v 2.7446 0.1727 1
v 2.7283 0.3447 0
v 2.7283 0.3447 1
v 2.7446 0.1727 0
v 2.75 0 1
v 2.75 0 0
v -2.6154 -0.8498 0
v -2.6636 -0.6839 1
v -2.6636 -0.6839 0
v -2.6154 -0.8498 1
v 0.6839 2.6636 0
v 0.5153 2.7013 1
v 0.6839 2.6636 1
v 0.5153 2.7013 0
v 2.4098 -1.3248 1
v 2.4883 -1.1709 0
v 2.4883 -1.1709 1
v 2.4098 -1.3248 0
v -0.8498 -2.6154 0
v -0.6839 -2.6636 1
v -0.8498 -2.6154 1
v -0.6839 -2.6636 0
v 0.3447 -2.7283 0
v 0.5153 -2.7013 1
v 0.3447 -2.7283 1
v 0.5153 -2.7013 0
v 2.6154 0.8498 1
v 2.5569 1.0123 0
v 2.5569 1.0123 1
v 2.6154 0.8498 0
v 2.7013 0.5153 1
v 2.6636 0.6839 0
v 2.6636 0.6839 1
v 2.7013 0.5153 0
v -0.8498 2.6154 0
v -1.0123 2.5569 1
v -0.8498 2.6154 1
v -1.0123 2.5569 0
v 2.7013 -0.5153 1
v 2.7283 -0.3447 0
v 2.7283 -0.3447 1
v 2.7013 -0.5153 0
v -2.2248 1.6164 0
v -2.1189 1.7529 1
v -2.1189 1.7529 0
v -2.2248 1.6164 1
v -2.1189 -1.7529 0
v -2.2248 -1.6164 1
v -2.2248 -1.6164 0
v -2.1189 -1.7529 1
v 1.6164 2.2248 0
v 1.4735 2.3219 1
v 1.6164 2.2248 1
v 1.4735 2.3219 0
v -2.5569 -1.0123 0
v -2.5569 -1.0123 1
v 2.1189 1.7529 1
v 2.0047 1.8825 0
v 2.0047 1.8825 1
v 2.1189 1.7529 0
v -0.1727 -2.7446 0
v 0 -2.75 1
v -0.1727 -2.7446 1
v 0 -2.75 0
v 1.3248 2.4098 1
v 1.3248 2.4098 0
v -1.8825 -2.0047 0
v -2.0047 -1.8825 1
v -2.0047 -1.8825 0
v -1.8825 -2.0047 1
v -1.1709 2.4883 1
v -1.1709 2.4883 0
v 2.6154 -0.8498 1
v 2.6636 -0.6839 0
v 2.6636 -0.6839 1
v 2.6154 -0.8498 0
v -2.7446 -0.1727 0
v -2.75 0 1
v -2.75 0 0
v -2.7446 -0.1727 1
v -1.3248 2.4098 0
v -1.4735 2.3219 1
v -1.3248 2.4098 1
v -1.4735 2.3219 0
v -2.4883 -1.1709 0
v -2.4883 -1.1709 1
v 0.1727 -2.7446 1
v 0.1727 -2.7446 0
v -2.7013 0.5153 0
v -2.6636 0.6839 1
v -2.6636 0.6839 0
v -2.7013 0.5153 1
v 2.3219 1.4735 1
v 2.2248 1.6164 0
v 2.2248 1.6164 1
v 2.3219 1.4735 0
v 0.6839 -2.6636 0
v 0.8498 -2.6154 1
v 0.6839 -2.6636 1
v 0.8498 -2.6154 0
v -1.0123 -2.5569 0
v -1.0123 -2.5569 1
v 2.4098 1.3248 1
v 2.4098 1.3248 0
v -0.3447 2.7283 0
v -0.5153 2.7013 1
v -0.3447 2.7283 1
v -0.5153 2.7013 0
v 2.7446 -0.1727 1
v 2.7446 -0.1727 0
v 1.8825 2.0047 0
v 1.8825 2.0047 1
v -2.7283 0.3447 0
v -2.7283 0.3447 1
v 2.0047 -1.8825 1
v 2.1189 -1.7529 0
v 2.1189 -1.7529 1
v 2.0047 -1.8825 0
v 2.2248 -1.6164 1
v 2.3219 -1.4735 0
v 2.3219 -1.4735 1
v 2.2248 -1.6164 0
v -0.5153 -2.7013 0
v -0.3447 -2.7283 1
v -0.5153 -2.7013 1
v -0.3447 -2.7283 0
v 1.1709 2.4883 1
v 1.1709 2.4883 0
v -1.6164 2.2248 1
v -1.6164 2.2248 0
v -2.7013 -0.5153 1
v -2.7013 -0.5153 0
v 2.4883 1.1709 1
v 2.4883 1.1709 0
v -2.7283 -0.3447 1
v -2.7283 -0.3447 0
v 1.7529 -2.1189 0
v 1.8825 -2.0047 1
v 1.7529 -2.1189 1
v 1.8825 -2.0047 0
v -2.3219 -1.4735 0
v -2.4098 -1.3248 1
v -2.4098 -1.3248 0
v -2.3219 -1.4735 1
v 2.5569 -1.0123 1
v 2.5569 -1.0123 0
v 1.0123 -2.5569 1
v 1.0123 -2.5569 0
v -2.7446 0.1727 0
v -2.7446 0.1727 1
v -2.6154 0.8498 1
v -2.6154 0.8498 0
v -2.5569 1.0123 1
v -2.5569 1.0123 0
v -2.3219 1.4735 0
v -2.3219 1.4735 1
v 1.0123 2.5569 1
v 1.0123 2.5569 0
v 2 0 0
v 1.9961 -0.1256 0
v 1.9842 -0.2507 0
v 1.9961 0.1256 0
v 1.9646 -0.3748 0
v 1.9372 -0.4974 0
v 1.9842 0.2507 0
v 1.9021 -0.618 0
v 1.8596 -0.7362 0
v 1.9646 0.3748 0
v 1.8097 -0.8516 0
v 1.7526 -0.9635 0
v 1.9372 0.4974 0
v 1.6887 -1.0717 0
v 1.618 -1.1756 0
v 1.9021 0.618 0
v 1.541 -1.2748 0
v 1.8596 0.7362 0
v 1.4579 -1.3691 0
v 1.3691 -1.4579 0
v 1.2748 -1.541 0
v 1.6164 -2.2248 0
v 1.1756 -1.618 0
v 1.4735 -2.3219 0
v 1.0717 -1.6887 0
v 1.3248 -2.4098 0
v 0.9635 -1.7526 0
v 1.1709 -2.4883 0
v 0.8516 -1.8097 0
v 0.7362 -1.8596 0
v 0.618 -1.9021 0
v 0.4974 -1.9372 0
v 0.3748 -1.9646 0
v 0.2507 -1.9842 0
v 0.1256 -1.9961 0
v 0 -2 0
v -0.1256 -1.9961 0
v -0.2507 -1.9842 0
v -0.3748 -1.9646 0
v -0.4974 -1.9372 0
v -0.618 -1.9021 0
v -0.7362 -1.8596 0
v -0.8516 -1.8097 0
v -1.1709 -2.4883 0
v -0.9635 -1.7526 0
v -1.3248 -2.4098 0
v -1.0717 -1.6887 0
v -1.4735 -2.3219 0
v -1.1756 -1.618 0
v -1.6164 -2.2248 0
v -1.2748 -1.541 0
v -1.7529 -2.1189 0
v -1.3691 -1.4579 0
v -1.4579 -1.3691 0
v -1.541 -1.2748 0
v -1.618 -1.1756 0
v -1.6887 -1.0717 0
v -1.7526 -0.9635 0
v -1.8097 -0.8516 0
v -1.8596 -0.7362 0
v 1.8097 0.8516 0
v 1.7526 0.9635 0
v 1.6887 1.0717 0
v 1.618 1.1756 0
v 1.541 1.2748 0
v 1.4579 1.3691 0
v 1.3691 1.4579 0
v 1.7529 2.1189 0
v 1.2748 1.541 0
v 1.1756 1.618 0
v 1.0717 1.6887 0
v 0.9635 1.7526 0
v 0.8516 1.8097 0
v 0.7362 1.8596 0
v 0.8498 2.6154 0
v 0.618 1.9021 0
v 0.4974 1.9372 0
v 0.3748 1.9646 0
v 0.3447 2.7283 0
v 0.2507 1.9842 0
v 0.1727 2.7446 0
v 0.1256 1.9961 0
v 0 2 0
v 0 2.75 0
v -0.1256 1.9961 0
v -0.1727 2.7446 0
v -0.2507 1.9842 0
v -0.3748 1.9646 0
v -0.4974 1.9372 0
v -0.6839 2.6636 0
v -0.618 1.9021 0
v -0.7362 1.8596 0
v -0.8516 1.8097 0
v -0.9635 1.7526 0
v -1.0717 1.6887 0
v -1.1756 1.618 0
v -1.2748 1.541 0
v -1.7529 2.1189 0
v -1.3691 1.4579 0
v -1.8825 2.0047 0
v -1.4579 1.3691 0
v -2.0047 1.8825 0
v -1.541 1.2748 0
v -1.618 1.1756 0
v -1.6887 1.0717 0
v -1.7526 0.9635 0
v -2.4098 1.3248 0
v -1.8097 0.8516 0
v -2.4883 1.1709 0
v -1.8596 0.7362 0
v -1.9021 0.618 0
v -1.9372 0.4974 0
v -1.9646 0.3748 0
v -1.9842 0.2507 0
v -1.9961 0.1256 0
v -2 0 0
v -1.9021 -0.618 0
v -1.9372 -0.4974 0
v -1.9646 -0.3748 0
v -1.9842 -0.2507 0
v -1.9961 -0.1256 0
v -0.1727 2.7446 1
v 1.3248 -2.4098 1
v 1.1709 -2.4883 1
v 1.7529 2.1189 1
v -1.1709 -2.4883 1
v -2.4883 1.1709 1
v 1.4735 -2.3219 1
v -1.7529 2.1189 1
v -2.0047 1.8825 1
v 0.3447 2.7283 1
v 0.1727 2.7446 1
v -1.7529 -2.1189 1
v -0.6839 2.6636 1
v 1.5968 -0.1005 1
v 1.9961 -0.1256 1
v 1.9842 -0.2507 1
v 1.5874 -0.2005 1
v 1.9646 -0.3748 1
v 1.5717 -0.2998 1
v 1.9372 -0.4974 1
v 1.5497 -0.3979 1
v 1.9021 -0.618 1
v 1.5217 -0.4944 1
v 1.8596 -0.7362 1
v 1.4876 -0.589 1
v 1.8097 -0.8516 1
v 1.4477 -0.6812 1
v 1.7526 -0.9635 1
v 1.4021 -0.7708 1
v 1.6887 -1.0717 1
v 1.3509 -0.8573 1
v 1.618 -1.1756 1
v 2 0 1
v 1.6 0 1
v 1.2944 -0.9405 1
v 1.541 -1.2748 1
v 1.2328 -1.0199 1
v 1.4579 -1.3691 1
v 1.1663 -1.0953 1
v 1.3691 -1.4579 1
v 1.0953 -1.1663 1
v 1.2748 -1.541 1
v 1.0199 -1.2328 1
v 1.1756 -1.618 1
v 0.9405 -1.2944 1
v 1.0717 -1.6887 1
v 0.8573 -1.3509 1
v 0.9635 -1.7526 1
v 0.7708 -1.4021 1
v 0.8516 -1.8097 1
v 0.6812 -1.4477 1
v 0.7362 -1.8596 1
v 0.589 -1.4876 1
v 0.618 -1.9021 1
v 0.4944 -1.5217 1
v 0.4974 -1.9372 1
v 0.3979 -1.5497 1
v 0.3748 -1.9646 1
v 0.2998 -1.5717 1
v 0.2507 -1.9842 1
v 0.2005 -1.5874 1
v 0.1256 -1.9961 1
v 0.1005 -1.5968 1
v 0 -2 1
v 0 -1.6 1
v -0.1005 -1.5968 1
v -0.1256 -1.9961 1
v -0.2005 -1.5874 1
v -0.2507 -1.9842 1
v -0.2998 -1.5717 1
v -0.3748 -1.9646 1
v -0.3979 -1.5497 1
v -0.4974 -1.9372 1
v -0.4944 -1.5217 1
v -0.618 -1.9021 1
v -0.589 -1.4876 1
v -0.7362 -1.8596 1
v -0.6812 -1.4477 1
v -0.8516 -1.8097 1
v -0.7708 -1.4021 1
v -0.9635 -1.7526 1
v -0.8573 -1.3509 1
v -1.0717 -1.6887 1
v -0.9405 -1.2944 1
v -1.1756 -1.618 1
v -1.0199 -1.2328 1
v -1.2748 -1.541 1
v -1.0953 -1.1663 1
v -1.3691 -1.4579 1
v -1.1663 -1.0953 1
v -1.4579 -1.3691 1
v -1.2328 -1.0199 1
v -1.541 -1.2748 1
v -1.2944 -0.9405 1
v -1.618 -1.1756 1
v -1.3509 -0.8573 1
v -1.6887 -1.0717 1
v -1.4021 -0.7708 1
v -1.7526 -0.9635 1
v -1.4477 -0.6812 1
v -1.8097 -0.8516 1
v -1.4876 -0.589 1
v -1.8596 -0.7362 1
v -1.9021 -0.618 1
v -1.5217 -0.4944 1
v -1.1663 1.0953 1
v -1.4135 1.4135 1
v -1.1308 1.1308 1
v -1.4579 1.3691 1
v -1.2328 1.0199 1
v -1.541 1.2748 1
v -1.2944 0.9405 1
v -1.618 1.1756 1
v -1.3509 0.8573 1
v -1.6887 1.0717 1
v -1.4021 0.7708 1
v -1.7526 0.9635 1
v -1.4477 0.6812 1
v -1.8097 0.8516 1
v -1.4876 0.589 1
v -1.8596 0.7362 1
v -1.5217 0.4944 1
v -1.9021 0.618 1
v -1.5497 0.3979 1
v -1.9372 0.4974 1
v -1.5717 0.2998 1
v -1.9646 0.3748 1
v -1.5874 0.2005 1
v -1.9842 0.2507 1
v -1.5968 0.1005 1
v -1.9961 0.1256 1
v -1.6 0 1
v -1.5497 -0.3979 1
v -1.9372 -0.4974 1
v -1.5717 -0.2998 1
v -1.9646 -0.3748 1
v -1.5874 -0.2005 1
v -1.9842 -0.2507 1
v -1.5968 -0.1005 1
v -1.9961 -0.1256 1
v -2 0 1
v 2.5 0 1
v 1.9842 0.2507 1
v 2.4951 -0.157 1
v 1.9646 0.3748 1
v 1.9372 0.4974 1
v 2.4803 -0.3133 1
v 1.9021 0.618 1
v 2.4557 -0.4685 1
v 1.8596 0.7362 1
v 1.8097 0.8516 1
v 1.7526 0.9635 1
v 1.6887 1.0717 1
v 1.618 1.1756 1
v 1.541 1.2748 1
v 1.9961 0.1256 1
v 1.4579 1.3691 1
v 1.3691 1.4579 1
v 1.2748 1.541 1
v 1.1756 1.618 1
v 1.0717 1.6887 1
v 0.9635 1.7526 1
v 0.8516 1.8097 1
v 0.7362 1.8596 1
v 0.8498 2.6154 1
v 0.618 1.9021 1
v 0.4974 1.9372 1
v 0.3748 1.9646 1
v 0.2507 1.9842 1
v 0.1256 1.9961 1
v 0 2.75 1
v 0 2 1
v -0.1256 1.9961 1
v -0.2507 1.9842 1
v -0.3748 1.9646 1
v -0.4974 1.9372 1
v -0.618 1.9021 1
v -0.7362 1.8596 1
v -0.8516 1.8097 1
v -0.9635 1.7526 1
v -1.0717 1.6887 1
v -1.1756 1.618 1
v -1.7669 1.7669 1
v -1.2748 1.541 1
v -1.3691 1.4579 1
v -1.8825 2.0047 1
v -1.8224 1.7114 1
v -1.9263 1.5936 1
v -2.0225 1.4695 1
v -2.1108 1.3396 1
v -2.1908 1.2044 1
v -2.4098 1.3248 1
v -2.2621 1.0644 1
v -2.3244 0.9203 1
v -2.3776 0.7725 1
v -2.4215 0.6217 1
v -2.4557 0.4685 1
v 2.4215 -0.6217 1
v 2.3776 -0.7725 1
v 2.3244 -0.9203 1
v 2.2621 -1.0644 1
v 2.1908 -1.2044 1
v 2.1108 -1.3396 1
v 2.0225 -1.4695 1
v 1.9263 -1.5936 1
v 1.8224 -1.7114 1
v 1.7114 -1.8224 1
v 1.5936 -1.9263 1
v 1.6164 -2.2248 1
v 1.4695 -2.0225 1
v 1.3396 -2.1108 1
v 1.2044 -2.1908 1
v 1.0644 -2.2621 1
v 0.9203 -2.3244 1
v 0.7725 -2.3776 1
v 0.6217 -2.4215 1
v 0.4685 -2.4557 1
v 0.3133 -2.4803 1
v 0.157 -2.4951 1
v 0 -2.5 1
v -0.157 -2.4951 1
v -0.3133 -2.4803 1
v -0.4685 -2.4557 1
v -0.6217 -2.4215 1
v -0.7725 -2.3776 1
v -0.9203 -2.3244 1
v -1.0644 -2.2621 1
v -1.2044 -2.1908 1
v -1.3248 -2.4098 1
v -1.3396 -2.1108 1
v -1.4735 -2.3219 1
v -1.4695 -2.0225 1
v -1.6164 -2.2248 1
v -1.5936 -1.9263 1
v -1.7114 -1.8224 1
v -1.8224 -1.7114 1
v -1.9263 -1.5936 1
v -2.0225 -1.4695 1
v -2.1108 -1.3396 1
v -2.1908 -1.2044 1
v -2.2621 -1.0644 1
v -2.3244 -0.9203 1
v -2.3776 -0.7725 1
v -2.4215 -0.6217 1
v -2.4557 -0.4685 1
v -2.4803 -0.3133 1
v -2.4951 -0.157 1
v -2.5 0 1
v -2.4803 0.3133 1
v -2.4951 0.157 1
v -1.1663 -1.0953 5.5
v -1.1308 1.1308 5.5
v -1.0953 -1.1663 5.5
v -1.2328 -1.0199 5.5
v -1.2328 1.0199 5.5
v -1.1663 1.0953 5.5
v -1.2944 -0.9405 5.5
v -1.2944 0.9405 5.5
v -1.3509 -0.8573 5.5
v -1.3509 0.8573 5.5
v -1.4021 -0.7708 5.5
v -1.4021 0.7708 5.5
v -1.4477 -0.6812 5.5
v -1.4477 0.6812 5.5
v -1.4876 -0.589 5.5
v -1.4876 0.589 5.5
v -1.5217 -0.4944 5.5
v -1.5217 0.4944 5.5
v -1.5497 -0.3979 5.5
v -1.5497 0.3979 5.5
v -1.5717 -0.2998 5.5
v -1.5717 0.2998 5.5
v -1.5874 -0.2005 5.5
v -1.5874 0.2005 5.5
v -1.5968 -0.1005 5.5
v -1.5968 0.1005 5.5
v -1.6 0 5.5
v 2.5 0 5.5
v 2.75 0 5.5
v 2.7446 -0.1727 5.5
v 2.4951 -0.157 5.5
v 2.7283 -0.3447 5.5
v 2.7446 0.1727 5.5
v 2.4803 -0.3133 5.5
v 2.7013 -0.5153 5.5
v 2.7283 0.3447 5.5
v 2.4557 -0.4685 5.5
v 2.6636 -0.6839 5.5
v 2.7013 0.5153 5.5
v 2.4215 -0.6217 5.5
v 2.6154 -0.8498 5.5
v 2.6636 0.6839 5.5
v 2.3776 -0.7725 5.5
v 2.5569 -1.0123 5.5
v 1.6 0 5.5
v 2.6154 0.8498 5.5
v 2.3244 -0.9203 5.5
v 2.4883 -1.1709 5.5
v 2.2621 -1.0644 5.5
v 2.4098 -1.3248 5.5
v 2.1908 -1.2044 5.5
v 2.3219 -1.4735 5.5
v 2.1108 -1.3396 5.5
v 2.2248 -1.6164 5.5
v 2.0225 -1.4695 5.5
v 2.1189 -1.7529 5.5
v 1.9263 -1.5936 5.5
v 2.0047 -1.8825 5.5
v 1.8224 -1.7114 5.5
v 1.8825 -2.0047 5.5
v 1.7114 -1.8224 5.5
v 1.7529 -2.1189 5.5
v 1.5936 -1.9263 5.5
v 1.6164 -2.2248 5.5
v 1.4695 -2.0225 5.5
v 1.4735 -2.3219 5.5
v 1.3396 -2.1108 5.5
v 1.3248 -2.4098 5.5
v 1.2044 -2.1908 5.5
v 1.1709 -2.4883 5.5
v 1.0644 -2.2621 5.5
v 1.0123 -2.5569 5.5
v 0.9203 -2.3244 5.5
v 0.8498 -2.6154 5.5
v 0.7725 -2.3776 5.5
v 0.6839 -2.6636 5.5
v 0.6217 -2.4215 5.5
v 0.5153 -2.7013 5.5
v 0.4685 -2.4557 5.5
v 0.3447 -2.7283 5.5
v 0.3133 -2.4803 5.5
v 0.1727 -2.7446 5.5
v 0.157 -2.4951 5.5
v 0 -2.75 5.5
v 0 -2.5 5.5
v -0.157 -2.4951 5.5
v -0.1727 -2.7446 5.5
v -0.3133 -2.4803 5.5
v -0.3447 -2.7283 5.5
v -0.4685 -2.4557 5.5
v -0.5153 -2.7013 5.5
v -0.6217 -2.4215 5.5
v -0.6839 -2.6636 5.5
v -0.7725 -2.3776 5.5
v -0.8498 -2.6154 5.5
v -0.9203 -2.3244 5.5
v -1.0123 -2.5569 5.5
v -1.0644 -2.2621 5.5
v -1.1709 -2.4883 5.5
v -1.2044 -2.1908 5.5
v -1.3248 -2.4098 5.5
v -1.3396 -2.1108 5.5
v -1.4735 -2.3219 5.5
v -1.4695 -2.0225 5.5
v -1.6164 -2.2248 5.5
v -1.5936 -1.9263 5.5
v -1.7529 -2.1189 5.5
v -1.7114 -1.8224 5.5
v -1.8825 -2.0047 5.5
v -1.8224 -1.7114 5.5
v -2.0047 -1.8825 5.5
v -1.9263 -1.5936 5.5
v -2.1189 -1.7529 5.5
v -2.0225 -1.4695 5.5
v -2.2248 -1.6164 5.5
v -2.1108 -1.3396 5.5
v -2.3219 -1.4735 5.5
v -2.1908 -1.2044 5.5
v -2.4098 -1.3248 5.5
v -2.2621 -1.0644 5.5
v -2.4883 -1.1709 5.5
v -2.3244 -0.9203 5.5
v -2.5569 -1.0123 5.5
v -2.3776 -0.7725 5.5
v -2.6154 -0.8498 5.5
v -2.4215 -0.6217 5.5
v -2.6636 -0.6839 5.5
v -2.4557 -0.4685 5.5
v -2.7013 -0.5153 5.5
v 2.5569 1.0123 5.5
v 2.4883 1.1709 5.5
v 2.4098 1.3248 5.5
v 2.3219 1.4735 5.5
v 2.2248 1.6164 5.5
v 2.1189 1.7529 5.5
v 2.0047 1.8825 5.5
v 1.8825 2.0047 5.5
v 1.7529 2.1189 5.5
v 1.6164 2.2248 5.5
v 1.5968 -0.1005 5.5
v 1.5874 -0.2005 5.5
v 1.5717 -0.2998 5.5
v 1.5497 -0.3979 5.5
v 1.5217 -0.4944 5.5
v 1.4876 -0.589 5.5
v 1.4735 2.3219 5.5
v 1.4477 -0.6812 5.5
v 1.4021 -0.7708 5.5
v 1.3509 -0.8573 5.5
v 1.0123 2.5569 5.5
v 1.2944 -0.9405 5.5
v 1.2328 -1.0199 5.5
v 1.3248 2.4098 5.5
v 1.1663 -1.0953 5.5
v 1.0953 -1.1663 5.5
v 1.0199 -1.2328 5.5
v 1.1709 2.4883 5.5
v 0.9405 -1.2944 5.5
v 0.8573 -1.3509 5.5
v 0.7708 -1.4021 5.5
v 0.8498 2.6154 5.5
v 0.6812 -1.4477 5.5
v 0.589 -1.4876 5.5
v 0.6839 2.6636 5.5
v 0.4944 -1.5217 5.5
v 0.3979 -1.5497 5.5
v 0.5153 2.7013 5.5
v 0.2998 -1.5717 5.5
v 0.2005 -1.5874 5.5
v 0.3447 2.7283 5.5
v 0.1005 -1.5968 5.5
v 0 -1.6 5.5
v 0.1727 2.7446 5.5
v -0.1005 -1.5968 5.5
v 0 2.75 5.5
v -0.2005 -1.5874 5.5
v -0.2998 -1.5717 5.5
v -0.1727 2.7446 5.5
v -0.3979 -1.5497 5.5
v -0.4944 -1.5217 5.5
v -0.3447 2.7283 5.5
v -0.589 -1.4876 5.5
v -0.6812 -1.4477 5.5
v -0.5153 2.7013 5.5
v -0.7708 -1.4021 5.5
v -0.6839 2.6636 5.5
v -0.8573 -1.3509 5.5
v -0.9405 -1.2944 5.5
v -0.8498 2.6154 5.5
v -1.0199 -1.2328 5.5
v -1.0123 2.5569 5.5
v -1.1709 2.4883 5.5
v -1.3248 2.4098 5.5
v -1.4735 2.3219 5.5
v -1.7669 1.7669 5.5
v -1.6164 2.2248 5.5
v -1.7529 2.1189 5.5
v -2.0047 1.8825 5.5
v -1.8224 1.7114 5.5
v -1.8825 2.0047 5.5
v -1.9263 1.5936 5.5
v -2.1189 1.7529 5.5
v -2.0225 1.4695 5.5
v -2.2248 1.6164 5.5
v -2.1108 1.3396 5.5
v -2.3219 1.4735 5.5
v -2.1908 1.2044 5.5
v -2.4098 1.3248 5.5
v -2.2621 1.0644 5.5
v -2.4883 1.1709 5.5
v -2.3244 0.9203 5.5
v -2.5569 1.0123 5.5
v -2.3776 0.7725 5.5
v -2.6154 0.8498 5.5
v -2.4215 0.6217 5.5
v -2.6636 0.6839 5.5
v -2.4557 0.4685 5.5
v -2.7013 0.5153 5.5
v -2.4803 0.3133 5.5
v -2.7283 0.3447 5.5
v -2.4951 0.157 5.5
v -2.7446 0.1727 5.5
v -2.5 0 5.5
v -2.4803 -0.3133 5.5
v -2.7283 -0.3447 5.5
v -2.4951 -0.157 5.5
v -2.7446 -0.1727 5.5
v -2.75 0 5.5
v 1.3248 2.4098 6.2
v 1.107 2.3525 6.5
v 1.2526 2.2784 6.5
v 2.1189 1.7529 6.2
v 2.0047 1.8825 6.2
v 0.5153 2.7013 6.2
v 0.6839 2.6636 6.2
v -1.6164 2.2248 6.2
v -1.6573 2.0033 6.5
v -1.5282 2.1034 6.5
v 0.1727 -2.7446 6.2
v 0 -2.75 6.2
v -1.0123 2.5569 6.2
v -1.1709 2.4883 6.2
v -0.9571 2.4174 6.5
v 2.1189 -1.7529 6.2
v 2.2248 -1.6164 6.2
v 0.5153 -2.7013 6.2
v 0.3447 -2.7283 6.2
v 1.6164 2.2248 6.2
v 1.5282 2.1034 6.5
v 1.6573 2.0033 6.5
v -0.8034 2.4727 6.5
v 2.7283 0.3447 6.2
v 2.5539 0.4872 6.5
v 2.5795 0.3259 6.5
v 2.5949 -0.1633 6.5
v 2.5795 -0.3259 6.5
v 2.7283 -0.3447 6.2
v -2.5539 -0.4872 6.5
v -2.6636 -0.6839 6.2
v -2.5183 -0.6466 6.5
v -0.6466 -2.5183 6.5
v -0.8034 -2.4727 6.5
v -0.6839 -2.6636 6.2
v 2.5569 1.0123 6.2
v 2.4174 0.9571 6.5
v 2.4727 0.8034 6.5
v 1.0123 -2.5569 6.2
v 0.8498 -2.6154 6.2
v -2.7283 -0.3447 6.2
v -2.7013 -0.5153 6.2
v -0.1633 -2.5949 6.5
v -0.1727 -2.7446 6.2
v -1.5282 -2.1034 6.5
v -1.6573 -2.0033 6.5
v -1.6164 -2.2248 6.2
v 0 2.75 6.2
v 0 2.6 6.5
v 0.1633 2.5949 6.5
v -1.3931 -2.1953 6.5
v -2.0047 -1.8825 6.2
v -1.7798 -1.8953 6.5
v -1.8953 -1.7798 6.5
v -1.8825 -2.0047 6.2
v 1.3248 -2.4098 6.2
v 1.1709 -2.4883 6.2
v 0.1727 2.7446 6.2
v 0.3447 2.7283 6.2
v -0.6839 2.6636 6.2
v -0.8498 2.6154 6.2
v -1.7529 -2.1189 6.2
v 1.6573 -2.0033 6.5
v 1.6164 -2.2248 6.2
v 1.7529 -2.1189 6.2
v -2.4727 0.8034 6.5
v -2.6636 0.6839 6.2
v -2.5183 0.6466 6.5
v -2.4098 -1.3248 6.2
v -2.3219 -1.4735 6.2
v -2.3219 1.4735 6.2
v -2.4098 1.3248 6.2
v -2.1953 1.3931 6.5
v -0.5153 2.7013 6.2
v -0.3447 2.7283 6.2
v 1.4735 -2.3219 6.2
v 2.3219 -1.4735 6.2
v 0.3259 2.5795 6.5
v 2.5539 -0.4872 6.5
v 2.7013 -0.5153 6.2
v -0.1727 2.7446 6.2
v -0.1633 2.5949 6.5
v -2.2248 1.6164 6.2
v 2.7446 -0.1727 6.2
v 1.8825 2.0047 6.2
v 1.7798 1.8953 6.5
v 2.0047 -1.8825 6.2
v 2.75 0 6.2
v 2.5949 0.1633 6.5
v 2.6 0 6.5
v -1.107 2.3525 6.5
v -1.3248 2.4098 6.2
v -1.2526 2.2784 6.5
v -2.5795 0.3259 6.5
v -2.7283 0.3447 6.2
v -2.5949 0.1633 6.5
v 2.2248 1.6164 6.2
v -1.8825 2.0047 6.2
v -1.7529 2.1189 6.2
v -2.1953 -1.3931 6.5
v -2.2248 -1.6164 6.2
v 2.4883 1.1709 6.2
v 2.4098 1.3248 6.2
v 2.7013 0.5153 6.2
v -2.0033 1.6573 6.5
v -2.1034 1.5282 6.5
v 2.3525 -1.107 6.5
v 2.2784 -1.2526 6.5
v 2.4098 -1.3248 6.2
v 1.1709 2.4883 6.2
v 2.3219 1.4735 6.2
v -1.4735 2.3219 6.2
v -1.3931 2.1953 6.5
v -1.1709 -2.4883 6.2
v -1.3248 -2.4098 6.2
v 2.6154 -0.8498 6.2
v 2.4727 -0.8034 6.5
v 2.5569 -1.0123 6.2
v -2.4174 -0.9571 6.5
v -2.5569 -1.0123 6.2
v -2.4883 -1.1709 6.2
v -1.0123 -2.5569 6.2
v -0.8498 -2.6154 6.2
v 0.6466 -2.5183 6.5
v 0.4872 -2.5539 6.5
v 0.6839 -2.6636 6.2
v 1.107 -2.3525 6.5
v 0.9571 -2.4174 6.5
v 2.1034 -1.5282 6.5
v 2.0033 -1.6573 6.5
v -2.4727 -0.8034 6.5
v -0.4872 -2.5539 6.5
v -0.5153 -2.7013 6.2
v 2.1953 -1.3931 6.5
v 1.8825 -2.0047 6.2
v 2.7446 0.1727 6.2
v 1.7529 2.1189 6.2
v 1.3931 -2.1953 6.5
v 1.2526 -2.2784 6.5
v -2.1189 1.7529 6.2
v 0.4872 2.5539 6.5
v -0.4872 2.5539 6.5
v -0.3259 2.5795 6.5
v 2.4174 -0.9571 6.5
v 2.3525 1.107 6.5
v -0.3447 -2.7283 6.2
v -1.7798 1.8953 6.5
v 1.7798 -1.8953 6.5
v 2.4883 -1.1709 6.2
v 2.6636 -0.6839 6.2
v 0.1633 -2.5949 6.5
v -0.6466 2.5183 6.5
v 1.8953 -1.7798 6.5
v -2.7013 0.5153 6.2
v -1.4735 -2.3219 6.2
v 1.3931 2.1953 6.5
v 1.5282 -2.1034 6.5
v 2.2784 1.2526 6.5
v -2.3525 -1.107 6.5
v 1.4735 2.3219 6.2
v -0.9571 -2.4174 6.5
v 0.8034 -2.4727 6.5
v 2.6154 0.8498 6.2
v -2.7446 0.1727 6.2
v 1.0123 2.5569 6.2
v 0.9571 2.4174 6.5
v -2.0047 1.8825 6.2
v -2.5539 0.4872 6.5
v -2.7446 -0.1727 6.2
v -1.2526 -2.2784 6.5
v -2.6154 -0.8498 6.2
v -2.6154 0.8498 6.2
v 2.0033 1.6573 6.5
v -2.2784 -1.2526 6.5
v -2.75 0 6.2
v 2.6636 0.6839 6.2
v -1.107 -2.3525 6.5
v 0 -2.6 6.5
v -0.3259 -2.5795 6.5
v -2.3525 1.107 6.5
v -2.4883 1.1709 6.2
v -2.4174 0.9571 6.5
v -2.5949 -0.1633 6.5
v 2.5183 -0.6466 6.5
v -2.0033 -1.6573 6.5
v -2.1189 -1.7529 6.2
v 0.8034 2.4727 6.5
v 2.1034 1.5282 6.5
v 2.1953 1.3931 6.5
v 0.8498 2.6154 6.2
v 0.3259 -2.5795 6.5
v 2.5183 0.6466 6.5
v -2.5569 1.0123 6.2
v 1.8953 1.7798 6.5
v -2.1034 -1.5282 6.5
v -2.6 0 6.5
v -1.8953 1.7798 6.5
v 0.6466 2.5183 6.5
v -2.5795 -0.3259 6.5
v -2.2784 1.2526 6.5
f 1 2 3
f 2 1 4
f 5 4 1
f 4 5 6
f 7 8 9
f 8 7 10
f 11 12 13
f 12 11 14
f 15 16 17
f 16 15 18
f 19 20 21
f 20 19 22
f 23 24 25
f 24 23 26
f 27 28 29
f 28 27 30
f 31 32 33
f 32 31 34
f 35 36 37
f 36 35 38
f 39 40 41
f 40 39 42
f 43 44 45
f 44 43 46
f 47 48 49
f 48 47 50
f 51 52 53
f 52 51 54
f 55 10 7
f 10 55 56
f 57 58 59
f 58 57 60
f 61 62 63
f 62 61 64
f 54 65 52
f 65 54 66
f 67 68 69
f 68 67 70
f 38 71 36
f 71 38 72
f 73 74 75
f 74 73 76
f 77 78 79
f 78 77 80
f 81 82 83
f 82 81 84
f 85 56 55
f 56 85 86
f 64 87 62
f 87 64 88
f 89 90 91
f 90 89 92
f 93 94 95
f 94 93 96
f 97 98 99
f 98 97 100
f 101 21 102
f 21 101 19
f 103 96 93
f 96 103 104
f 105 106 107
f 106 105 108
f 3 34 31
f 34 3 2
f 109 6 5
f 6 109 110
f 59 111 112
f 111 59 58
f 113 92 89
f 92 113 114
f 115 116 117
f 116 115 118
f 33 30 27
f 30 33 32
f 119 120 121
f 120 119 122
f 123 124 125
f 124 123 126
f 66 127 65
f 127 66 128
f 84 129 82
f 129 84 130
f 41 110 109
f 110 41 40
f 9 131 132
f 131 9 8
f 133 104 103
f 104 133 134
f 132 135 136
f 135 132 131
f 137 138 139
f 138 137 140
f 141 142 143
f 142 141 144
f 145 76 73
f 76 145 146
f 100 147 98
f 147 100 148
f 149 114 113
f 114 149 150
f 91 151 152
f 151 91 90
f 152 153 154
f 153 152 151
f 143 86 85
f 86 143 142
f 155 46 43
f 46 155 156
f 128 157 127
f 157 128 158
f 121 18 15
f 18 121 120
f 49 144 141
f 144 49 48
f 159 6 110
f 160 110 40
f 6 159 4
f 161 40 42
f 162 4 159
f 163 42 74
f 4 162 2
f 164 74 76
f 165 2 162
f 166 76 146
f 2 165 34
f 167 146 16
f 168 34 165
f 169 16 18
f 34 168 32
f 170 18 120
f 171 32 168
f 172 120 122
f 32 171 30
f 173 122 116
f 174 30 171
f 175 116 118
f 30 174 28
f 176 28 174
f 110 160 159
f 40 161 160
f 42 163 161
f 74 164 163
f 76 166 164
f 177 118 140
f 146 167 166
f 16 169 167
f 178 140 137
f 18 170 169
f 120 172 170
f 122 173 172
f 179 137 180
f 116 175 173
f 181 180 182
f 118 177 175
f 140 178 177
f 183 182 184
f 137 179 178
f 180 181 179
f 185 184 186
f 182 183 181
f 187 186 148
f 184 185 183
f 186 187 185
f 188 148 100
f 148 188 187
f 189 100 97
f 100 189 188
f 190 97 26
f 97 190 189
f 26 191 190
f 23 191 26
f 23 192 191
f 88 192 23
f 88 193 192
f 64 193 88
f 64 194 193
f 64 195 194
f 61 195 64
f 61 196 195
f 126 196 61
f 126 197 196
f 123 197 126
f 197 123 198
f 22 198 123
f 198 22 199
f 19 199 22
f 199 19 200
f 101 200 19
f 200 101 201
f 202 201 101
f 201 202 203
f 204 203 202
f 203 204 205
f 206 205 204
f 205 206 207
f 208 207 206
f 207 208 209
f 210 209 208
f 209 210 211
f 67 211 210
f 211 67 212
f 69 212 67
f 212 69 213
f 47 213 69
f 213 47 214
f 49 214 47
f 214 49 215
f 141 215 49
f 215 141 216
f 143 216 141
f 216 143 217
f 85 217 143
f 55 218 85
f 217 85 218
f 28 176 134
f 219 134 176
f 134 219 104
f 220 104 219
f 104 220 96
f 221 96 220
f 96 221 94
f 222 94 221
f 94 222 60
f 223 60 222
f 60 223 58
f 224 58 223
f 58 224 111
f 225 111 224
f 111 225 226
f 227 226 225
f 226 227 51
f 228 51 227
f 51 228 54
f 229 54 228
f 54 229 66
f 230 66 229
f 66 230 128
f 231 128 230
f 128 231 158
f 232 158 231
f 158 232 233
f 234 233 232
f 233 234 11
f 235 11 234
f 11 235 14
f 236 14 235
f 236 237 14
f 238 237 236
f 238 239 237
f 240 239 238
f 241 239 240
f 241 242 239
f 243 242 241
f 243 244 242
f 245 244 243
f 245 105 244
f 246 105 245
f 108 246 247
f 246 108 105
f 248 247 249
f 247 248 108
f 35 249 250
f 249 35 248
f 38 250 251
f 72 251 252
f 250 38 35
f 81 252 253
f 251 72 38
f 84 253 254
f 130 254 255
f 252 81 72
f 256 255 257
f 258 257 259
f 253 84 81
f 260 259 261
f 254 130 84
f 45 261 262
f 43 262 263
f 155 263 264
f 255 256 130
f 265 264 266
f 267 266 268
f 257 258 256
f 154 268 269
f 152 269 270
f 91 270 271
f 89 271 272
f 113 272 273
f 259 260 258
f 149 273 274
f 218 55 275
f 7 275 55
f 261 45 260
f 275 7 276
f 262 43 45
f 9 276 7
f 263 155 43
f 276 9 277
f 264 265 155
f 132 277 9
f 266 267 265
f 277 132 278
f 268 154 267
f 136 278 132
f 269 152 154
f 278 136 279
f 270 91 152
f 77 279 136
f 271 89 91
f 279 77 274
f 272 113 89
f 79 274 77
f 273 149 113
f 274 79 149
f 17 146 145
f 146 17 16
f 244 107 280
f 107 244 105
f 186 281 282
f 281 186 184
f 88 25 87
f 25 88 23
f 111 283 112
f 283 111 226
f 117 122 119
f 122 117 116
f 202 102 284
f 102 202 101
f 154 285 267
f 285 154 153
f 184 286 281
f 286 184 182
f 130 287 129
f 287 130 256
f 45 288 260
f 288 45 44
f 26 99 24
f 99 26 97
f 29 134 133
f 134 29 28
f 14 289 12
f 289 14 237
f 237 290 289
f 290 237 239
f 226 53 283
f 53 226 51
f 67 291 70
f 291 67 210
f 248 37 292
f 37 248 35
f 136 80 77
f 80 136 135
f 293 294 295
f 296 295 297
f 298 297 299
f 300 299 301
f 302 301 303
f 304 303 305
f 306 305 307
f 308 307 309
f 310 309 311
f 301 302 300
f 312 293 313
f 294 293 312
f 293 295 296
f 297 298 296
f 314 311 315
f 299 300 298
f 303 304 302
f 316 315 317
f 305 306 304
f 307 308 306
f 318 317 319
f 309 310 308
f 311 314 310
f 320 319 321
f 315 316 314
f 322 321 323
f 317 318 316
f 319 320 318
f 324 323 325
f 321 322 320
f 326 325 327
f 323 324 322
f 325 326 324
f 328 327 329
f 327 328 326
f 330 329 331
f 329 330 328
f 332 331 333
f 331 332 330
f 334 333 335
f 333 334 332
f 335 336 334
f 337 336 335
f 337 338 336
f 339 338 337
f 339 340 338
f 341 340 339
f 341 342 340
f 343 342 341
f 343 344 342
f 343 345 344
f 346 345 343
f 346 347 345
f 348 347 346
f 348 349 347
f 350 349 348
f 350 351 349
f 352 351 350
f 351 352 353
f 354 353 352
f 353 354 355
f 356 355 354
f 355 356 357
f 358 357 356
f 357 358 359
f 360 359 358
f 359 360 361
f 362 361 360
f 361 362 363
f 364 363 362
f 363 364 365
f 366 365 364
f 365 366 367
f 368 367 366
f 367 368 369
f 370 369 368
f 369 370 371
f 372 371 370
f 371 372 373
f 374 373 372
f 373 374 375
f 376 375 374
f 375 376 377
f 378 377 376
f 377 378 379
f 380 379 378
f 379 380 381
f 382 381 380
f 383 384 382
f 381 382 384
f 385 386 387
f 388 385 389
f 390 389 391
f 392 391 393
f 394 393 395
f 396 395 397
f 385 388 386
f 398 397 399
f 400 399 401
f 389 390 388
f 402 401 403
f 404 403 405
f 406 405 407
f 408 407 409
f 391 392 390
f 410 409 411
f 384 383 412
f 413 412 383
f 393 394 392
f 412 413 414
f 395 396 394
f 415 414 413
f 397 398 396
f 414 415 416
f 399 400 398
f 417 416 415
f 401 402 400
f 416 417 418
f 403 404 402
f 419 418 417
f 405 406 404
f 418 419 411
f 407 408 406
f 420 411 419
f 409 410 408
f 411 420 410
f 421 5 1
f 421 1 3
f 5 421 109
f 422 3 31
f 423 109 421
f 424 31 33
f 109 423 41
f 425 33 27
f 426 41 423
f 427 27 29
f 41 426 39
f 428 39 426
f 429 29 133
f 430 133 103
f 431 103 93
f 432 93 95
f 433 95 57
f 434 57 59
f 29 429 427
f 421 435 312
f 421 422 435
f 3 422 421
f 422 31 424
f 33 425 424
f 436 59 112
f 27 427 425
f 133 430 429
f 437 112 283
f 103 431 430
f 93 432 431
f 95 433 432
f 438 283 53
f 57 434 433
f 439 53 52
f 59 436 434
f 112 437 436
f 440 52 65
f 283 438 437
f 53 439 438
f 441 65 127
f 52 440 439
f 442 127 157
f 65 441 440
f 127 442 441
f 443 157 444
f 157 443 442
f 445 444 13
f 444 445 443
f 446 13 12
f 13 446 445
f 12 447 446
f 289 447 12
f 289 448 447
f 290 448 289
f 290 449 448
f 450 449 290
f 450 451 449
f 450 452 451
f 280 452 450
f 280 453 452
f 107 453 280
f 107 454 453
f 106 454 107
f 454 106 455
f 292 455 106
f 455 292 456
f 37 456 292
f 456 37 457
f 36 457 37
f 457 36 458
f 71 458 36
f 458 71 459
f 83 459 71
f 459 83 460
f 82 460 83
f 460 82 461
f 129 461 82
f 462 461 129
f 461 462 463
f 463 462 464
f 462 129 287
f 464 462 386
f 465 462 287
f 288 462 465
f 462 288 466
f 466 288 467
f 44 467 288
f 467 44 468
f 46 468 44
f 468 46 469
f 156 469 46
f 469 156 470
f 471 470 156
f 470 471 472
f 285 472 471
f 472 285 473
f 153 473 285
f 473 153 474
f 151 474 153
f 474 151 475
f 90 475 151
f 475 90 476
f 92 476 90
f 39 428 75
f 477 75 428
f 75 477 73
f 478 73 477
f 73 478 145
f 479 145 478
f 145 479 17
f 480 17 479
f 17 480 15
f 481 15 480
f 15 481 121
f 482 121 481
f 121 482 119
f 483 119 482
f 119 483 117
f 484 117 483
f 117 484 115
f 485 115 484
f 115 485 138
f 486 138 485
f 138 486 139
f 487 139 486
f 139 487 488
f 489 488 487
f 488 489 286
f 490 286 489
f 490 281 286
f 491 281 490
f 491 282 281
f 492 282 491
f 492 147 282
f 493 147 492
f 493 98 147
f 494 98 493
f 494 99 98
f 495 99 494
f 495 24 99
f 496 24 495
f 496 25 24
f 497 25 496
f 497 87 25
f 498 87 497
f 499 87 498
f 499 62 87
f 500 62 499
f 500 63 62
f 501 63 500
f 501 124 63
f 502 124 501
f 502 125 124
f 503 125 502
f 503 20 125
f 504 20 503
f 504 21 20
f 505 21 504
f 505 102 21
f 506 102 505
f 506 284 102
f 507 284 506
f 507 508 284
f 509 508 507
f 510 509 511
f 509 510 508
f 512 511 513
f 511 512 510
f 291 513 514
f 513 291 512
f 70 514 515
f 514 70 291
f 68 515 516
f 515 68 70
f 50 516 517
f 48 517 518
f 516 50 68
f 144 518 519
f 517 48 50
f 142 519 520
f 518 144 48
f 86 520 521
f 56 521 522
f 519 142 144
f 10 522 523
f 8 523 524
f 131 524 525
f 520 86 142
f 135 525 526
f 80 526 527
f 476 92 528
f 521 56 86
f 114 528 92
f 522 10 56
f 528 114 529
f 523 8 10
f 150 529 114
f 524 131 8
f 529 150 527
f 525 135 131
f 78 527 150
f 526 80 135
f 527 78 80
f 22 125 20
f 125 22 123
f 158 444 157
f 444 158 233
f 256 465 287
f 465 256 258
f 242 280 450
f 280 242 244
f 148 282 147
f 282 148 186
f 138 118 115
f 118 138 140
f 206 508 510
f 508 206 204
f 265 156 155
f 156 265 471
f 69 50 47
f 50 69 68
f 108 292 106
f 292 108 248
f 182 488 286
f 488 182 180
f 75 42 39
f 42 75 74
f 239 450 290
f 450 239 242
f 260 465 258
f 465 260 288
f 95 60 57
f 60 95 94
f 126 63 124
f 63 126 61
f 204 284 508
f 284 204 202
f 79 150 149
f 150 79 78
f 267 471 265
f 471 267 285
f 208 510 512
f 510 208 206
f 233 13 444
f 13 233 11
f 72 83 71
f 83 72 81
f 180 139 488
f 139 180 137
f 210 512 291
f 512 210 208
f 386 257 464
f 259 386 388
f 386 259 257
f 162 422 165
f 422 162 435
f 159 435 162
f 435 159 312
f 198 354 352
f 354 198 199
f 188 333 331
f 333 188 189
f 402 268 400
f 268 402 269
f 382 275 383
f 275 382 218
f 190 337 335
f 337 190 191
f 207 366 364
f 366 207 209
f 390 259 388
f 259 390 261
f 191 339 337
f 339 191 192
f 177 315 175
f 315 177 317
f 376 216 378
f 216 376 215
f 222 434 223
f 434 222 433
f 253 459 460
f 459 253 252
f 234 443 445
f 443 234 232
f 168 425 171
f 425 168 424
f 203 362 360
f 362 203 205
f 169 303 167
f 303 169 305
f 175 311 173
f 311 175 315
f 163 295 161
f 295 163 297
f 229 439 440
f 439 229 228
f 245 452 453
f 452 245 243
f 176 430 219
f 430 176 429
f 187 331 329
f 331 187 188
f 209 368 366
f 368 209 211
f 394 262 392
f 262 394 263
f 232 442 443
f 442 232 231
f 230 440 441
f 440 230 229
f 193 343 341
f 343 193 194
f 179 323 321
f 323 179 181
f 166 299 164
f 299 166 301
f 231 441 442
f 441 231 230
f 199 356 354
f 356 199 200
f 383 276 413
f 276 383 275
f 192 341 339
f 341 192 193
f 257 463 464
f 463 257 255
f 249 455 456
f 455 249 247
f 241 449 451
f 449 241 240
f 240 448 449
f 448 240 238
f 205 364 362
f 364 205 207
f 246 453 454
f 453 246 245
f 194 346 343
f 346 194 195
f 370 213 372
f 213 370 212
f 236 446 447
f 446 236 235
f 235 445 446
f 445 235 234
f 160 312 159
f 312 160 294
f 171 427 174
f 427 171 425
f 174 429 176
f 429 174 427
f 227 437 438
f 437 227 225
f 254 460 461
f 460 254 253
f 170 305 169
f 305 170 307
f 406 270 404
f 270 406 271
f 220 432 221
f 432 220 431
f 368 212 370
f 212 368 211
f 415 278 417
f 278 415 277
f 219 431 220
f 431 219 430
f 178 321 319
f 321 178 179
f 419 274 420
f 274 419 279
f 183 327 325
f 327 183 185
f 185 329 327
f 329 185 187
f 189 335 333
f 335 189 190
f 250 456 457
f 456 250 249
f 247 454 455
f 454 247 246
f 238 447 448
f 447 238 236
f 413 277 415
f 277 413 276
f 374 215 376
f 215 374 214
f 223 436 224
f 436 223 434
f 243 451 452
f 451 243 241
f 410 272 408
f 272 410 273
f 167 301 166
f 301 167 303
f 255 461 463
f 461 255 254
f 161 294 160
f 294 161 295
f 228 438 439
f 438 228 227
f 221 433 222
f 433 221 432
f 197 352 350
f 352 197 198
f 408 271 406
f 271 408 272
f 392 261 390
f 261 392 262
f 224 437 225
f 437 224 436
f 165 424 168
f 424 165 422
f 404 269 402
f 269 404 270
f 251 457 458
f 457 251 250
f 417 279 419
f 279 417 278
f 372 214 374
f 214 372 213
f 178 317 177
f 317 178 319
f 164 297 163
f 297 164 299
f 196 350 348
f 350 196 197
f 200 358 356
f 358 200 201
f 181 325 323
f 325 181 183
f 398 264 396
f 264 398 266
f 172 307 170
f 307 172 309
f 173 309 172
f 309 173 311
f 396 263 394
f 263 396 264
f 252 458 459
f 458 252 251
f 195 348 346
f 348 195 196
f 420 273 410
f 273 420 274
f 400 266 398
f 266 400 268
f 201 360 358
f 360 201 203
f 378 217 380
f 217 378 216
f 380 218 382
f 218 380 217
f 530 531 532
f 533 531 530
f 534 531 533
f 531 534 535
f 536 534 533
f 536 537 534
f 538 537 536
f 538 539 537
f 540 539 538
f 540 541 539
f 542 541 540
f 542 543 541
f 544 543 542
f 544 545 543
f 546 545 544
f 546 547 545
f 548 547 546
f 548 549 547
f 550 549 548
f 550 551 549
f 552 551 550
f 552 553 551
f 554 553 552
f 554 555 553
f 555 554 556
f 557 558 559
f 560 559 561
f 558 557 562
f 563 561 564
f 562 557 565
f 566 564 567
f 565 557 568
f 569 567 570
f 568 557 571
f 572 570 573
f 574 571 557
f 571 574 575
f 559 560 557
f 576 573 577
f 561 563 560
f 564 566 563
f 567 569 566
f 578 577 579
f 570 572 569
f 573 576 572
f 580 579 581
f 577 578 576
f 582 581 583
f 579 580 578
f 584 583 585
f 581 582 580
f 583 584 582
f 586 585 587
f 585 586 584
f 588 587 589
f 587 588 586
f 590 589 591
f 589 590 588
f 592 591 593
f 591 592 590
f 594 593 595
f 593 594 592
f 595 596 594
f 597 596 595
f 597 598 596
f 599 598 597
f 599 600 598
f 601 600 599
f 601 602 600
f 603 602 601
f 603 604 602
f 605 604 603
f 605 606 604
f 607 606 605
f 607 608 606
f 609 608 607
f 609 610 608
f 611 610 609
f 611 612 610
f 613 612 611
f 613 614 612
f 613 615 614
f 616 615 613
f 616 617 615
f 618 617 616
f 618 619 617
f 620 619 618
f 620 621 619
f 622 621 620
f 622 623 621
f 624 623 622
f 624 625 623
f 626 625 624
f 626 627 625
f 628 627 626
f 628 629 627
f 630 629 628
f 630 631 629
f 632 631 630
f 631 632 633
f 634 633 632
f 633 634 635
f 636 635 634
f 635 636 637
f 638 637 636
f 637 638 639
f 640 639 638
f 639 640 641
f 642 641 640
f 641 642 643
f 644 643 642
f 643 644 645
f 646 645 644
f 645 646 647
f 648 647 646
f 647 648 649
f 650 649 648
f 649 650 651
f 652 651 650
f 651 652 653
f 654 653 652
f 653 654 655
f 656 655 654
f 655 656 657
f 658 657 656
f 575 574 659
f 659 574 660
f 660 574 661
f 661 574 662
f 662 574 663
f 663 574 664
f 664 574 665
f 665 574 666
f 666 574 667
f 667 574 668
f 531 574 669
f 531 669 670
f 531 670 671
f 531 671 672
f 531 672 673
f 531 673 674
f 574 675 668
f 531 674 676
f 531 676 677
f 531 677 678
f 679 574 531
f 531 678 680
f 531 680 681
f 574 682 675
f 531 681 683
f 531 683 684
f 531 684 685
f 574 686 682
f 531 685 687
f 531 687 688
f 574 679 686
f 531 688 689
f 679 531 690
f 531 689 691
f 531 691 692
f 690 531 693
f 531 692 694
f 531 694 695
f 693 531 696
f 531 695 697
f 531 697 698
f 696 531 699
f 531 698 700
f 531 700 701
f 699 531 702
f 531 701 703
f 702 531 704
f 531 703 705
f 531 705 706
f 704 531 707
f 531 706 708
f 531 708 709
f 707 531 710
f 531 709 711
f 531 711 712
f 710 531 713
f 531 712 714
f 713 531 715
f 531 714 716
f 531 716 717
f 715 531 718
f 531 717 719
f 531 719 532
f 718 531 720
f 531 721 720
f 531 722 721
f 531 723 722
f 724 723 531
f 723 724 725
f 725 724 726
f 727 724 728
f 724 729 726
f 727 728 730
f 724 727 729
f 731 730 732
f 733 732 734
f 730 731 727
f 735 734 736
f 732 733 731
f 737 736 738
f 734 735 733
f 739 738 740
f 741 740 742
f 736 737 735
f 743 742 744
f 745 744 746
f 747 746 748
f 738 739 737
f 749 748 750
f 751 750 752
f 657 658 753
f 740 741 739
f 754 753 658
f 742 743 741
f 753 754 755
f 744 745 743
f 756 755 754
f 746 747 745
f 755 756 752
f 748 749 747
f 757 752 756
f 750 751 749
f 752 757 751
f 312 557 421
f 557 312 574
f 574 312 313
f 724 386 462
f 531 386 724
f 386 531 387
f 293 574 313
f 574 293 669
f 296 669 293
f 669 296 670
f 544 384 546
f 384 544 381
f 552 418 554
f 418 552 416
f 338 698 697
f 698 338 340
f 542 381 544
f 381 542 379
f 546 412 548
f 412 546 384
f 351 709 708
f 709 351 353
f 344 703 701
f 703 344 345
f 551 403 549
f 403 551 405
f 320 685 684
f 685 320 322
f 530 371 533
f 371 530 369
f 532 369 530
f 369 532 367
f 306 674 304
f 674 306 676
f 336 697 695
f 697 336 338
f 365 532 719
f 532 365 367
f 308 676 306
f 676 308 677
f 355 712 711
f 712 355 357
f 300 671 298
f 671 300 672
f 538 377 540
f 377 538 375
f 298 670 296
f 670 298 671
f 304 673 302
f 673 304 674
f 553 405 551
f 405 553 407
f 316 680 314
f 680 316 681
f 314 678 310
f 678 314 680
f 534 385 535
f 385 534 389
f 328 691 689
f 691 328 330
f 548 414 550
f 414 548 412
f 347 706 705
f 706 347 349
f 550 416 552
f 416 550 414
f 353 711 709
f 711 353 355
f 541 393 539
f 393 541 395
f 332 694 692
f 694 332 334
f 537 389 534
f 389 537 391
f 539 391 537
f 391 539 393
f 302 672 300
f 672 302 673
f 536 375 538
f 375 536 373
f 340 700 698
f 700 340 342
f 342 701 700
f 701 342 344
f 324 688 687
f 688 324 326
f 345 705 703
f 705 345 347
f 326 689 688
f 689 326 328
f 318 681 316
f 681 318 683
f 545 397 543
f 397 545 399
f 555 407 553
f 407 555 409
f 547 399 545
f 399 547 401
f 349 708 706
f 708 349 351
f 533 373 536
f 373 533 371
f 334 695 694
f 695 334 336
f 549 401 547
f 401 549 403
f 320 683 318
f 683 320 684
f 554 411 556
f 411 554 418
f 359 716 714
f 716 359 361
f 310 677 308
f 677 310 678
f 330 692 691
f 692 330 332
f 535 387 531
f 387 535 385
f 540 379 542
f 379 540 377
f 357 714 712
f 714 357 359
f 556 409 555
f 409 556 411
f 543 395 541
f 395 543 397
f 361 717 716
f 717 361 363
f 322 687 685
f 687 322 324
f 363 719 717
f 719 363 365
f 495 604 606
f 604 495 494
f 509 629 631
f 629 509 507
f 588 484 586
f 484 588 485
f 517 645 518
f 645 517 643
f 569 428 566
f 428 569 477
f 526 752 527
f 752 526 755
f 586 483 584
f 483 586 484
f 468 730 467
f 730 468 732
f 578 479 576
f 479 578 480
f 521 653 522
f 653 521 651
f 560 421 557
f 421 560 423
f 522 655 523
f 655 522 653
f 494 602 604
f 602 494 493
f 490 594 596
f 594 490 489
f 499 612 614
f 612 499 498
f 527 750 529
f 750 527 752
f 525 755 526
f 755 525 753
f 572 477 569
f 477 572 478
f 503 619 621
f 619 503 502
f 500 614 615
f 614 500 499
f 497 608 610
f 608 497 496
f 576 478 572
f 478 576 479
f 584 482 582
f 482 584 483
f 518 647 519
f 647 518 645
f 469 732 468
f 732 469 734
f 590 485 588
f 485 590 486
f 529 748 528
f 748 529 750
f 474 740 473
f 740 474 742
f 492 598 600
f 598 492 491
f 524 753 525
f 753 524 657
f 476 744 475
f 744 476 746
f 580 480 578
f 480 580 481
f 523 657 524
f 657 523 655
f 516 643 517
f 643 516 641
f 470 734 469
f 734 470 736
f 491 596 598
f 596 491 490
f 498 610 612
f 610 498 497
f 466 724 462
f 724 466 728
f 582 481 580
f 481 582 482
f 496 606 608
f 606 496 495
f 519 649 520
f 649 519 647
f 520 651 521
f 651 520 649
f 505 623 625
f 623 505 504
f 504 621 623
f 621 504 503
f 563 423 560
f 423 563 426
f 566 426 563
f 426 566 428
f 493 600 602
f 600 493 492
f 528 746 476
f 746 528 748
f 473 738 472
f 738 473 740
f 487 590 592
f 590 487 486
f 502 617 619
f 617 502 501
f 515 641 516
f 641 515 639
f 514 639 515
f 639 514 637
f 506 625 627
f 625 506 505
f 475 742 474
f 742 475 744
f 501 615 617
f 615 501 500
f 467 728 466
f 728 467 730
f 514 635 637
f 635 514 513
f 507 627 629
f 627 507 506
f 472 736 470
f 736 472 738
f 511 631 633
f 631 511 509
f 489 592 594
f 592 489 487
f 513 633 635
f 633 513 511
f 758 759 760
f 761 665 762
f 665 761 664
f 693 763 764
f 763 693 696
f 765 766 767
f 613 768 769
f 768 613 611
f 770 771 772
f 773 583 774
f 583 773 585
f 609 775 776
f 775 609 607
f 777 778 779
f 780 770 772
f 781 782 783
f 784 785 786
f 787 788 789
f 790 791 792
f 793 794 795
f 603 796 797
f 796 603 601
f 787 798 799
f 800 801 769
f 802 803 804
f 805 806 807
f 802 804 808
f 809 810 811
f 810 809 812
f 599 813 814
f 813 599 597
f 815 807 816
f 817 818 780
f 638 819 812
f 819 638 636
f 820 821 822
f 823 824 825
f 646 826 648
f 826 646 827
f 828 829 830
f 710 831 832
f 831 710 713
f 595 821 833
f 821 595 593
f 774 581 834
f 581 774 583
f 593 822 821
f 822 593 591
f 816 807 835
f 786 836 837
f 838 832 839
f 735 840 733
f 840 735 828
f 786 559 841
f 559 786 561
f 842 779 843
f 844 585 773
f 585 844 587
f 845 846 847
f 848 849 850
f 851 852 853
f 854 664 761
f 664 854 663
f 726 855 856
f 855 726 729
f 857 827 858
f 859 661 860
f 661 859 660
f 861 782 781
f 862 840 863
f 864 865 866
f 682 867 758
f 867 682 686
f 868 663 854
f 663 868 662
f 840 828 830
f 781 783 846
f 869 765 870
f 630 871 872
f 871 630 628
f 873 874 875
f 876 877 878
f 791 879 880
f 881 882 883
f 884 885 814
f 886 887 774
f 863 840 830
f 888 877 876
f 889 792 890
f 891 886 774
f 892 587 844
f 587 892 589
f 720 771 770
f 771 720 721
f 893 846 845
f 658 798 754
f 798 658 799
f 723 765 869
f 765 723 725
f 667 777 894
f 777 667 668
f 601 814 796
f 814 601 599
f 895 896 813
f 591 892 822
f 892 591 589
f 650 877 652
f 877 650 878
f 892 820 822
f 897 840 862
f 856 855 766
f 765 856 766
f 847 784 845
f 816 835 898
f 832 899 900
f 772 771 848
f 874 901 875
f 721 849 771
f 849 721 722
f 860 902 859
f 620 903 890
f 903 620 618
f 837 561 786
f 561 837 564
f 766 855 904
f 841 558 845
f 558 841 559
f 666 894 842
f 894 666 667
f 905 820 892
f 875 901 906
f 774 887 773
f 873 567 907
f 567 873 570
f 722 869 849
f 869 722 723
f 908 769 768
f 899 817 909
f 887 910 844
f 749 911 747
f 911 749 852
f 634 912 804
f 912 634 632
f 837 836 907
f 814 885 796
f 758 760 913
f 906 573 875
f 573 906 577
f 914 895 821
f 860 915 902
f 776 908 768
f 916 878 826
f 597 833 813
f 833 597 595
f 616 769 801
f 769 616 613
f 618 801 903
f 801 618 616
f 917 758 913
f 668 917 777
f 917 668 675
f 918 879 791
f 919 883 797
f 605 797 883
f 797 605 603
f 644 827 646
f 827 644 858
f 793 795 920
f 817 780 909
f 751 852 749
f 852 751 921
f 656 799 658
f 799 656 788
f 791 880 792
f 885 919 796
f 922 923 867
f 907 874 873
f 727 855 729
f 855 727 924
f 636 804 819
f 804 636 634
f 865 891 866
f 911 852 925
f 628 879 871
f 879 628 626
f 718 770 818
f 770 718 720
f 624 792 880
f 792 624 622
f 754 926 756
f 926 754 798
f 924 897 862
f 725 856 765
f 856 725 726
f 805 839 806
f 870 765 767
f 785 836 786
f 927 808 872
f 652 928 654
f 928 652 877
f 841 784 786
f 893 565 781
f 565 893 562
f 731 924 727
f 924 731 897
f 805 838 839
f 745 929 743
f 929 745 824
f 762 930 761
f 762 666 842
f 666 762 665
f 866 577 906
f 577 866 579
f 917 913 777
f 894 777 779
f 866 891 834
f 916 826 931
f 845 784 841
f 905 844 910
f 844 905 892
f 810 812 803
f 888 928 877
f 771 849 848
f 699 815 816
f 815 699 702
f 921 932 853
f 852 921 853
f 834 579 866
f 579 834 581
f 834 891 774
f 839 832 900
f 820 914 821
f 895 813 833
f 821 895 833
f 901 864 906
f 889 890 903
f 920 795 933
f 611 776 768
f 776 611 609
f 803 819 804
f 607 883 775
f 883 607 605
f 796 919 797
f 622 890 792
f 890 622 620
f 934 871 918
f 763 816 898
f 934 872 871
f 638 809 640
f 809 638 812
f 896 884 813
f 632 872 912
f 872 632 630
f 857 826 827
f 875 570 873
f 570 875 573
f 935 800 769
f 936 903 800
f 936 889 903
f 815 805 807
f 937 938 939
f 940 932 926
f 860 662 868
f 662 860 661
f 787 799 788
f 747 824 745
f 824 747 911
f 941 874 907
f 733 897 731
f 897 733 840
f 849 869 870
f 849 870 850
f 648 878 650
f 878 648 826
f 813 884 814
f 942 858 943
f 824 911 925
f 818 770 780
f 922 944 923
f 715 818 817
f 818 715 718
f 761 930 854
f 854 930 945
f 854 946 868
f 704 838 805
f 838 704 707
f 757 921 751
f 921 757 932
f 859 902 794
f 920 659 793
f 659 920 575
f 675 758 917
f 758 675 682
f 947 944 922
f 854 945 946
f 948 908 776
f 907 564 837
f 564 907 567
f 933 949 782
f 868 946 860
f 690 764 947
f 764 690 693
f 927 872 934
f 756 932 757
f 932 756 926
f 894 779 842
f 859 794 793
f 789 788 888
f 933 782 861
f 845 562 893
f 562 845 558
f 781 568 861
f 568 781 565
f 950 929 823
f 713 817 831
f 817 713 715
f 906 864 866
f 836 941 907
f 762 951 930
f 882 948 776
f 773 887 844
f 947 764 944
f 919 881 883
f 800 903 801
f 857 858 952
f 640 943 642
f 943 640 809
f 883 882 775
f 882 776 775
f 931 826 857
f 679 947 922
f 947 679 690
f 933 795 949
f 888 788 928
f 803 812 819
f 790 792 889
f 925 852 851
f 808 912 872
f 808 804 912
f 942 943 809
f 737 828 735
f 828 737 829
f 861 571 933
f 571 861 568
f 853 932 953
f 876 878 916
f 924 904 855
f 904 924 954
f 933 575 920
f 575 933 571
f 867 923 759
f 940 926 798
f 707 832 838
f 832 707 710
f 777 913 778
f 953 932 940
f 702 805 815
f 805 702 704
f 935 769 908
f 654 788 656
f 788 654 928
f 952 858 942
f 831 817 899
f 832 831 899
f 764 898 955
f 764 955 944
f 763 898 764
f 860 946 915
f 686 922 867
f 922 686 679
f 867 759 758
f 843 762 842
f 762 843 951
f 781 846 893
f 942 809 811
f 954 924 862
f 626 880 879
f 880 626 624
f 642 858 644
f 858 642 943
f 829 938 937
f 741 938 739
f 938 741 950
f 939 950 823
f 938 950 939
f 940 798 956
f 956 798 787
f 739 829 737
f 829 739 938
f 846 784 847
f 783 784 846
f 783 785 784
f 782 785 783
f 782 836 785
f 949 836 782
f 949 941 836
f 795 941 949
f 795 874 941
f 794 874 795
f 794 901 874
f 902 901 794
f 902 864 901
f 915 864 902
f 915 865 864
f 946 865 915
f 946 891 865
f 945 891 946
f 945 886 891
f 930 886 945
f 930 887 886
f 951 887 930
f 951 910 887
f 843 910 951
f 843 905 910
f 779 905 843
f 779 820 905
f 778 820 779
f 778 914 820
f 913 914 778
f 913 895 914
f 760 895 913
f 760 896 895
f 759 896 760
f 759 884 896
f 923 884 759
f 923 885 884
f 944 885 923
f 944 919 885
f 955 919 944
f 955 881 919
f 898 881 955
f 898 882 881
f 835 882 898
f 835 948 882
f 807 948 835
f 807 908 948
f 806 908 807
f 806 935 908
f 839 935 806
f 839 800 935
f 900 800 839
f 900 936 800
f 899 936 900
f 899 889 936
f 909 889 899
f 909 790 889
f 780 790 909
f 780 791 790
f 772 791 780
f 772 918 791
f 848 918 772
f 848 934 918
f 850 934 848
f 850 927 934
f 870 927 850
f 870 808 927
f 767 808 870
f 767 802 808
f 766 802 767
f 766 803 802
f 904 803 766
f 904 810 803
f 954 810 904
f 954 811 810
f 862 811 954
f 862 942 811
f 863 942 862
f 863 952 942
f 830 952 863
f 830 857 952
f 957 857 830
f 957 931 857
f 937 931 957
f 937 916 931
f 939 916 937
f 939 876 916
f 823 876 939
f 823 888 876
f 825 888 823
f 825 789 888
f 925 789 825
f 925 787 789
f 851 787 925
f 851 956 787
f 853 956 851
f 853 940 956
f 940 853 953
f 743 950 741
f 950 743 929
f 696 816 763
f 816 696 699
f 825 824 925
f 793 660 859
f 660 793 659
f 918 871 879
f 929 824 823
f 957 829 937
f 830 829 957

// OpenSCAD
module laterne(led=3, winkel=112.5)
{
    deckeldicke=1;
    mittenhoehe=1.5*led;
    mittenradius=led/2+1;
    bevel=0.3;
    
    //Boden
    difference()
    {
        //Sockel
        cylinder(h=deckeldicke,d=led+2.5,$fn=100);
        //Bohrung für LED-Rand
        cylinder(h=deckeldicke,d=led+1,$fn=100);
    }
    
    //Mitte
    difference()
    {
        translate([0,0,deckeldicke]) cylinder(h=mittenhoehe,r=mittenradius,$fn=100);
        union()
        {
            //LED-Bohrung
            translate([0,0,deckeldicke]) cylinder(h=mittenhoehe,d=led+0.2,$fn=100);
            //Abstrahlöffnung
            translate([0,0,deckeldicke]) sector(h=mittenhoehe, d=led*2, a1=0, a2=winkel);
        }
    }
    
    //Deckel
    hull()
    {
        translate([0,0,mittenhoehe+deckeldicke]) cylinder(h=deckeldicke-bevel,d=led+2.5,$fn=100);
        translate([0,0,mittenhoehe+2*deckeldicke-bevel]) cylinder(h=bevel,d=led+2.5-bevel,$fn=100);
    }
}

//cylinder sector https://gist.github.com/plumbum/78e3c8281e1c031601456df2aa8e37c6
module sector(h, d, a1, a2) 
{
    if (a2 - a1 > 180) 
    {
        difference() 
        {
            cylinder(h=h, d=d);
            translate([0,0,-0.5]) sector(h+1, d+1, a2-360, a1); 
        }
    } 
    else 
    {
        difference() 
        {
            cylinder(h=h, d=d);
            rotate([0,0,a1]) translate([-d/2, -d/2, -0.5]) cube([d, d/2, h+1]);
            rotate([0,0,a2]) translate([-d/2, 0, -0.5]) cube([d, d/2, h+1]);
        }
    }
}

//Positionslaterne 112.5°
//Hecklicht 135°
//Topplicht 225°
//LED-Größen 3mm oder 5mm
laterne(3, 135);
